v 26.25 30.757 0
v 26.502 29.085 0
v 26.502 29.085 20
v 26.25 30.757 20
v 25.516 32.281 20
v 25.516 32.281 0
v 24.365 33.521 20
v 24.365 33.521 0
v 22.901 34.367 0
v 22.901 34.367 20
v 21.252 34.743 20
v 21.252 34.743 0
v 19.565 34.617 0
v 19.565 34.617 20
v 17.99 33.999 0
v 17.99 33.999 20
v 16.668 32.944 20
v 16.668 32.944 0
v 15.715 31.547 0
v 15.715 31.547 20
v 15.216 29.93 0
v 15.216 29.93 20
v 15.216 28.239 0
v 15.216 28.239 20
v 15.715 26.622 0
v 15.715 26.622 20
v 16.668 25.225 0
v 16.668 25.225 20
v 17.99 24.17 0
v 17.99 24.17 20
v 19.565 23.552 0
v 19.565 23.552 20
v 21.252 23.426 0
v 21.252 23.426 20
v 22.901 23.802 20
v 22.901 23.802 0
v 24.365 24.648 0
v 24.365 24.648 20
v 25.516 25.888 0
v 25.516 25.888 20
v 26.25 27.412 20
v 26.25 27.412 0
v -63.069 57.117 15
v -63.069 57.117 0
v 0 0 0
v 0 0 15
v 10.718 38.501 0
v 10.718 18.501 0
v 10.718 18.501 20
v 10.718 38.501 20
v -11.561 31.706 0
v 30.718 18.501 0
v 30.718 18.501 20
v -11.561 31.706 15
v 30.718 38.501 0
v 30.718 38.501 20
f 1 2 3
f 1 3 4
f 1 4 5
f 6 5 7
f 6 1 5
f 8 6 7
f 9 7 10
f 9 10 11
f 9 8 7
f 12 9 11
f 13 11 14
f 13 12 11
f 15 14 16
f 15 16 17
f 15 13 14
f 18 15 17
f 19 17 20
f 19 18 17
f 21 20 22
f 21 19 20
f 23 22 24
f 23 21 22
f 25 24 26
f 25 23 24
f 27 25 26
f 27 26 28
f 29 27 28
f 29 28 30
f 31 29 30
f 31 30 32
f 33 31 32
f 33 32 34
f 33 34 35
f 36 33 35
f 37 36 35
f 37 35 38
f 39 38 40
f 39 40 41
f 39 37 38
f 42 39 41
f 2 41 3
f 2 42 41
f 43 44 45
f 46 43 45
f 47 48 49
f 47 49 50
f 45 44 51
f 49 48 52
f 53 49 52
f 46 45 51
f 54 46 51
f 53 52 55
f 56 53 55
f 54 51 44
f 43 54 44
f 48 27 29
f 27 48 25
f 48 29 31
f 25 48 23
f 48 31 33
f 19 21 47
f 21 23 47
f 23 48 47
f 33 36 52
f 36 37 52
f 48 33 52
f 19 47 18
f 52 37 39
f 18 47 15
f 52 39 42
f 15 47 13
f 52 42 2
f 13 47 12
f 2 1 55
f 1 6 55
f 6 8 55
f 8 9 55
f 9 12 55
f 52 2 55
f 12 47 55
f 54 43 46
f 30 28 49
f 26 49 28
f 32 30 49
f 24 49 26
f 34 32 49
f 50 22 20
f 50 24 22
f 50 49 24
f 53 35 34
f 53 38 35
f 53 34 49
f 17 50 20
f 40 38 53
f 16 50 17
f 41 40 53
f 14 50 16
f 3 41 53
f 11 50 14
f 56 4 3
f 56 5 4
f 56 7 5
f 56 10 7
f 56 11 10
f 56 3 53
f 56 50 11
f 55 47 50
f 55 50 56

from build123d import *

# Parameters (mm, degrees)
F1_DEPTH = 15
F2_W     = 20
F2_H     = 20
F3_DEPTH = 20
F4_DEPTH = 20
F5_R     = 5.674372
F6_DEPTH = 20


with BuildPart() as f1:
    # F0 (on Top) → F1 (new body)
    with BuildSketch(Plane.XY):
        Polygon((-63.06868, 57.116646), (0, 0), (-11.560683, 31.706035), align=None)
    extrude(amount=F1_DEPTH)


with BuildPart() as f3:
    # F2 (on Top) → F3 (new body)
    with BuildSketch(Plane.XY):
        with Locations((20.717662, 28.501092)):
            Rectangle(F2_W, F2_H)
    extrude(amount=F3_DEPTH)

    # F2 (on Top) → F4 (join)
    with BuildSketch(Plane.XY):
        with Locations((20.717662, 28.501092)):
            Rectangle(F2_W, F2_H)
    extrude(amount=F4_DEPTH)

    # F5 (on Top) → F6 (cut)
    with BuildSketch(Plane.XY):
        with Locations((20.827467, 29.084507)):
            Circle(F5_R)
    extrude(amount=F6_DEPTH, mode=Mode.SUBTRACT)


solid = Compound([f1.part, f3.part])
